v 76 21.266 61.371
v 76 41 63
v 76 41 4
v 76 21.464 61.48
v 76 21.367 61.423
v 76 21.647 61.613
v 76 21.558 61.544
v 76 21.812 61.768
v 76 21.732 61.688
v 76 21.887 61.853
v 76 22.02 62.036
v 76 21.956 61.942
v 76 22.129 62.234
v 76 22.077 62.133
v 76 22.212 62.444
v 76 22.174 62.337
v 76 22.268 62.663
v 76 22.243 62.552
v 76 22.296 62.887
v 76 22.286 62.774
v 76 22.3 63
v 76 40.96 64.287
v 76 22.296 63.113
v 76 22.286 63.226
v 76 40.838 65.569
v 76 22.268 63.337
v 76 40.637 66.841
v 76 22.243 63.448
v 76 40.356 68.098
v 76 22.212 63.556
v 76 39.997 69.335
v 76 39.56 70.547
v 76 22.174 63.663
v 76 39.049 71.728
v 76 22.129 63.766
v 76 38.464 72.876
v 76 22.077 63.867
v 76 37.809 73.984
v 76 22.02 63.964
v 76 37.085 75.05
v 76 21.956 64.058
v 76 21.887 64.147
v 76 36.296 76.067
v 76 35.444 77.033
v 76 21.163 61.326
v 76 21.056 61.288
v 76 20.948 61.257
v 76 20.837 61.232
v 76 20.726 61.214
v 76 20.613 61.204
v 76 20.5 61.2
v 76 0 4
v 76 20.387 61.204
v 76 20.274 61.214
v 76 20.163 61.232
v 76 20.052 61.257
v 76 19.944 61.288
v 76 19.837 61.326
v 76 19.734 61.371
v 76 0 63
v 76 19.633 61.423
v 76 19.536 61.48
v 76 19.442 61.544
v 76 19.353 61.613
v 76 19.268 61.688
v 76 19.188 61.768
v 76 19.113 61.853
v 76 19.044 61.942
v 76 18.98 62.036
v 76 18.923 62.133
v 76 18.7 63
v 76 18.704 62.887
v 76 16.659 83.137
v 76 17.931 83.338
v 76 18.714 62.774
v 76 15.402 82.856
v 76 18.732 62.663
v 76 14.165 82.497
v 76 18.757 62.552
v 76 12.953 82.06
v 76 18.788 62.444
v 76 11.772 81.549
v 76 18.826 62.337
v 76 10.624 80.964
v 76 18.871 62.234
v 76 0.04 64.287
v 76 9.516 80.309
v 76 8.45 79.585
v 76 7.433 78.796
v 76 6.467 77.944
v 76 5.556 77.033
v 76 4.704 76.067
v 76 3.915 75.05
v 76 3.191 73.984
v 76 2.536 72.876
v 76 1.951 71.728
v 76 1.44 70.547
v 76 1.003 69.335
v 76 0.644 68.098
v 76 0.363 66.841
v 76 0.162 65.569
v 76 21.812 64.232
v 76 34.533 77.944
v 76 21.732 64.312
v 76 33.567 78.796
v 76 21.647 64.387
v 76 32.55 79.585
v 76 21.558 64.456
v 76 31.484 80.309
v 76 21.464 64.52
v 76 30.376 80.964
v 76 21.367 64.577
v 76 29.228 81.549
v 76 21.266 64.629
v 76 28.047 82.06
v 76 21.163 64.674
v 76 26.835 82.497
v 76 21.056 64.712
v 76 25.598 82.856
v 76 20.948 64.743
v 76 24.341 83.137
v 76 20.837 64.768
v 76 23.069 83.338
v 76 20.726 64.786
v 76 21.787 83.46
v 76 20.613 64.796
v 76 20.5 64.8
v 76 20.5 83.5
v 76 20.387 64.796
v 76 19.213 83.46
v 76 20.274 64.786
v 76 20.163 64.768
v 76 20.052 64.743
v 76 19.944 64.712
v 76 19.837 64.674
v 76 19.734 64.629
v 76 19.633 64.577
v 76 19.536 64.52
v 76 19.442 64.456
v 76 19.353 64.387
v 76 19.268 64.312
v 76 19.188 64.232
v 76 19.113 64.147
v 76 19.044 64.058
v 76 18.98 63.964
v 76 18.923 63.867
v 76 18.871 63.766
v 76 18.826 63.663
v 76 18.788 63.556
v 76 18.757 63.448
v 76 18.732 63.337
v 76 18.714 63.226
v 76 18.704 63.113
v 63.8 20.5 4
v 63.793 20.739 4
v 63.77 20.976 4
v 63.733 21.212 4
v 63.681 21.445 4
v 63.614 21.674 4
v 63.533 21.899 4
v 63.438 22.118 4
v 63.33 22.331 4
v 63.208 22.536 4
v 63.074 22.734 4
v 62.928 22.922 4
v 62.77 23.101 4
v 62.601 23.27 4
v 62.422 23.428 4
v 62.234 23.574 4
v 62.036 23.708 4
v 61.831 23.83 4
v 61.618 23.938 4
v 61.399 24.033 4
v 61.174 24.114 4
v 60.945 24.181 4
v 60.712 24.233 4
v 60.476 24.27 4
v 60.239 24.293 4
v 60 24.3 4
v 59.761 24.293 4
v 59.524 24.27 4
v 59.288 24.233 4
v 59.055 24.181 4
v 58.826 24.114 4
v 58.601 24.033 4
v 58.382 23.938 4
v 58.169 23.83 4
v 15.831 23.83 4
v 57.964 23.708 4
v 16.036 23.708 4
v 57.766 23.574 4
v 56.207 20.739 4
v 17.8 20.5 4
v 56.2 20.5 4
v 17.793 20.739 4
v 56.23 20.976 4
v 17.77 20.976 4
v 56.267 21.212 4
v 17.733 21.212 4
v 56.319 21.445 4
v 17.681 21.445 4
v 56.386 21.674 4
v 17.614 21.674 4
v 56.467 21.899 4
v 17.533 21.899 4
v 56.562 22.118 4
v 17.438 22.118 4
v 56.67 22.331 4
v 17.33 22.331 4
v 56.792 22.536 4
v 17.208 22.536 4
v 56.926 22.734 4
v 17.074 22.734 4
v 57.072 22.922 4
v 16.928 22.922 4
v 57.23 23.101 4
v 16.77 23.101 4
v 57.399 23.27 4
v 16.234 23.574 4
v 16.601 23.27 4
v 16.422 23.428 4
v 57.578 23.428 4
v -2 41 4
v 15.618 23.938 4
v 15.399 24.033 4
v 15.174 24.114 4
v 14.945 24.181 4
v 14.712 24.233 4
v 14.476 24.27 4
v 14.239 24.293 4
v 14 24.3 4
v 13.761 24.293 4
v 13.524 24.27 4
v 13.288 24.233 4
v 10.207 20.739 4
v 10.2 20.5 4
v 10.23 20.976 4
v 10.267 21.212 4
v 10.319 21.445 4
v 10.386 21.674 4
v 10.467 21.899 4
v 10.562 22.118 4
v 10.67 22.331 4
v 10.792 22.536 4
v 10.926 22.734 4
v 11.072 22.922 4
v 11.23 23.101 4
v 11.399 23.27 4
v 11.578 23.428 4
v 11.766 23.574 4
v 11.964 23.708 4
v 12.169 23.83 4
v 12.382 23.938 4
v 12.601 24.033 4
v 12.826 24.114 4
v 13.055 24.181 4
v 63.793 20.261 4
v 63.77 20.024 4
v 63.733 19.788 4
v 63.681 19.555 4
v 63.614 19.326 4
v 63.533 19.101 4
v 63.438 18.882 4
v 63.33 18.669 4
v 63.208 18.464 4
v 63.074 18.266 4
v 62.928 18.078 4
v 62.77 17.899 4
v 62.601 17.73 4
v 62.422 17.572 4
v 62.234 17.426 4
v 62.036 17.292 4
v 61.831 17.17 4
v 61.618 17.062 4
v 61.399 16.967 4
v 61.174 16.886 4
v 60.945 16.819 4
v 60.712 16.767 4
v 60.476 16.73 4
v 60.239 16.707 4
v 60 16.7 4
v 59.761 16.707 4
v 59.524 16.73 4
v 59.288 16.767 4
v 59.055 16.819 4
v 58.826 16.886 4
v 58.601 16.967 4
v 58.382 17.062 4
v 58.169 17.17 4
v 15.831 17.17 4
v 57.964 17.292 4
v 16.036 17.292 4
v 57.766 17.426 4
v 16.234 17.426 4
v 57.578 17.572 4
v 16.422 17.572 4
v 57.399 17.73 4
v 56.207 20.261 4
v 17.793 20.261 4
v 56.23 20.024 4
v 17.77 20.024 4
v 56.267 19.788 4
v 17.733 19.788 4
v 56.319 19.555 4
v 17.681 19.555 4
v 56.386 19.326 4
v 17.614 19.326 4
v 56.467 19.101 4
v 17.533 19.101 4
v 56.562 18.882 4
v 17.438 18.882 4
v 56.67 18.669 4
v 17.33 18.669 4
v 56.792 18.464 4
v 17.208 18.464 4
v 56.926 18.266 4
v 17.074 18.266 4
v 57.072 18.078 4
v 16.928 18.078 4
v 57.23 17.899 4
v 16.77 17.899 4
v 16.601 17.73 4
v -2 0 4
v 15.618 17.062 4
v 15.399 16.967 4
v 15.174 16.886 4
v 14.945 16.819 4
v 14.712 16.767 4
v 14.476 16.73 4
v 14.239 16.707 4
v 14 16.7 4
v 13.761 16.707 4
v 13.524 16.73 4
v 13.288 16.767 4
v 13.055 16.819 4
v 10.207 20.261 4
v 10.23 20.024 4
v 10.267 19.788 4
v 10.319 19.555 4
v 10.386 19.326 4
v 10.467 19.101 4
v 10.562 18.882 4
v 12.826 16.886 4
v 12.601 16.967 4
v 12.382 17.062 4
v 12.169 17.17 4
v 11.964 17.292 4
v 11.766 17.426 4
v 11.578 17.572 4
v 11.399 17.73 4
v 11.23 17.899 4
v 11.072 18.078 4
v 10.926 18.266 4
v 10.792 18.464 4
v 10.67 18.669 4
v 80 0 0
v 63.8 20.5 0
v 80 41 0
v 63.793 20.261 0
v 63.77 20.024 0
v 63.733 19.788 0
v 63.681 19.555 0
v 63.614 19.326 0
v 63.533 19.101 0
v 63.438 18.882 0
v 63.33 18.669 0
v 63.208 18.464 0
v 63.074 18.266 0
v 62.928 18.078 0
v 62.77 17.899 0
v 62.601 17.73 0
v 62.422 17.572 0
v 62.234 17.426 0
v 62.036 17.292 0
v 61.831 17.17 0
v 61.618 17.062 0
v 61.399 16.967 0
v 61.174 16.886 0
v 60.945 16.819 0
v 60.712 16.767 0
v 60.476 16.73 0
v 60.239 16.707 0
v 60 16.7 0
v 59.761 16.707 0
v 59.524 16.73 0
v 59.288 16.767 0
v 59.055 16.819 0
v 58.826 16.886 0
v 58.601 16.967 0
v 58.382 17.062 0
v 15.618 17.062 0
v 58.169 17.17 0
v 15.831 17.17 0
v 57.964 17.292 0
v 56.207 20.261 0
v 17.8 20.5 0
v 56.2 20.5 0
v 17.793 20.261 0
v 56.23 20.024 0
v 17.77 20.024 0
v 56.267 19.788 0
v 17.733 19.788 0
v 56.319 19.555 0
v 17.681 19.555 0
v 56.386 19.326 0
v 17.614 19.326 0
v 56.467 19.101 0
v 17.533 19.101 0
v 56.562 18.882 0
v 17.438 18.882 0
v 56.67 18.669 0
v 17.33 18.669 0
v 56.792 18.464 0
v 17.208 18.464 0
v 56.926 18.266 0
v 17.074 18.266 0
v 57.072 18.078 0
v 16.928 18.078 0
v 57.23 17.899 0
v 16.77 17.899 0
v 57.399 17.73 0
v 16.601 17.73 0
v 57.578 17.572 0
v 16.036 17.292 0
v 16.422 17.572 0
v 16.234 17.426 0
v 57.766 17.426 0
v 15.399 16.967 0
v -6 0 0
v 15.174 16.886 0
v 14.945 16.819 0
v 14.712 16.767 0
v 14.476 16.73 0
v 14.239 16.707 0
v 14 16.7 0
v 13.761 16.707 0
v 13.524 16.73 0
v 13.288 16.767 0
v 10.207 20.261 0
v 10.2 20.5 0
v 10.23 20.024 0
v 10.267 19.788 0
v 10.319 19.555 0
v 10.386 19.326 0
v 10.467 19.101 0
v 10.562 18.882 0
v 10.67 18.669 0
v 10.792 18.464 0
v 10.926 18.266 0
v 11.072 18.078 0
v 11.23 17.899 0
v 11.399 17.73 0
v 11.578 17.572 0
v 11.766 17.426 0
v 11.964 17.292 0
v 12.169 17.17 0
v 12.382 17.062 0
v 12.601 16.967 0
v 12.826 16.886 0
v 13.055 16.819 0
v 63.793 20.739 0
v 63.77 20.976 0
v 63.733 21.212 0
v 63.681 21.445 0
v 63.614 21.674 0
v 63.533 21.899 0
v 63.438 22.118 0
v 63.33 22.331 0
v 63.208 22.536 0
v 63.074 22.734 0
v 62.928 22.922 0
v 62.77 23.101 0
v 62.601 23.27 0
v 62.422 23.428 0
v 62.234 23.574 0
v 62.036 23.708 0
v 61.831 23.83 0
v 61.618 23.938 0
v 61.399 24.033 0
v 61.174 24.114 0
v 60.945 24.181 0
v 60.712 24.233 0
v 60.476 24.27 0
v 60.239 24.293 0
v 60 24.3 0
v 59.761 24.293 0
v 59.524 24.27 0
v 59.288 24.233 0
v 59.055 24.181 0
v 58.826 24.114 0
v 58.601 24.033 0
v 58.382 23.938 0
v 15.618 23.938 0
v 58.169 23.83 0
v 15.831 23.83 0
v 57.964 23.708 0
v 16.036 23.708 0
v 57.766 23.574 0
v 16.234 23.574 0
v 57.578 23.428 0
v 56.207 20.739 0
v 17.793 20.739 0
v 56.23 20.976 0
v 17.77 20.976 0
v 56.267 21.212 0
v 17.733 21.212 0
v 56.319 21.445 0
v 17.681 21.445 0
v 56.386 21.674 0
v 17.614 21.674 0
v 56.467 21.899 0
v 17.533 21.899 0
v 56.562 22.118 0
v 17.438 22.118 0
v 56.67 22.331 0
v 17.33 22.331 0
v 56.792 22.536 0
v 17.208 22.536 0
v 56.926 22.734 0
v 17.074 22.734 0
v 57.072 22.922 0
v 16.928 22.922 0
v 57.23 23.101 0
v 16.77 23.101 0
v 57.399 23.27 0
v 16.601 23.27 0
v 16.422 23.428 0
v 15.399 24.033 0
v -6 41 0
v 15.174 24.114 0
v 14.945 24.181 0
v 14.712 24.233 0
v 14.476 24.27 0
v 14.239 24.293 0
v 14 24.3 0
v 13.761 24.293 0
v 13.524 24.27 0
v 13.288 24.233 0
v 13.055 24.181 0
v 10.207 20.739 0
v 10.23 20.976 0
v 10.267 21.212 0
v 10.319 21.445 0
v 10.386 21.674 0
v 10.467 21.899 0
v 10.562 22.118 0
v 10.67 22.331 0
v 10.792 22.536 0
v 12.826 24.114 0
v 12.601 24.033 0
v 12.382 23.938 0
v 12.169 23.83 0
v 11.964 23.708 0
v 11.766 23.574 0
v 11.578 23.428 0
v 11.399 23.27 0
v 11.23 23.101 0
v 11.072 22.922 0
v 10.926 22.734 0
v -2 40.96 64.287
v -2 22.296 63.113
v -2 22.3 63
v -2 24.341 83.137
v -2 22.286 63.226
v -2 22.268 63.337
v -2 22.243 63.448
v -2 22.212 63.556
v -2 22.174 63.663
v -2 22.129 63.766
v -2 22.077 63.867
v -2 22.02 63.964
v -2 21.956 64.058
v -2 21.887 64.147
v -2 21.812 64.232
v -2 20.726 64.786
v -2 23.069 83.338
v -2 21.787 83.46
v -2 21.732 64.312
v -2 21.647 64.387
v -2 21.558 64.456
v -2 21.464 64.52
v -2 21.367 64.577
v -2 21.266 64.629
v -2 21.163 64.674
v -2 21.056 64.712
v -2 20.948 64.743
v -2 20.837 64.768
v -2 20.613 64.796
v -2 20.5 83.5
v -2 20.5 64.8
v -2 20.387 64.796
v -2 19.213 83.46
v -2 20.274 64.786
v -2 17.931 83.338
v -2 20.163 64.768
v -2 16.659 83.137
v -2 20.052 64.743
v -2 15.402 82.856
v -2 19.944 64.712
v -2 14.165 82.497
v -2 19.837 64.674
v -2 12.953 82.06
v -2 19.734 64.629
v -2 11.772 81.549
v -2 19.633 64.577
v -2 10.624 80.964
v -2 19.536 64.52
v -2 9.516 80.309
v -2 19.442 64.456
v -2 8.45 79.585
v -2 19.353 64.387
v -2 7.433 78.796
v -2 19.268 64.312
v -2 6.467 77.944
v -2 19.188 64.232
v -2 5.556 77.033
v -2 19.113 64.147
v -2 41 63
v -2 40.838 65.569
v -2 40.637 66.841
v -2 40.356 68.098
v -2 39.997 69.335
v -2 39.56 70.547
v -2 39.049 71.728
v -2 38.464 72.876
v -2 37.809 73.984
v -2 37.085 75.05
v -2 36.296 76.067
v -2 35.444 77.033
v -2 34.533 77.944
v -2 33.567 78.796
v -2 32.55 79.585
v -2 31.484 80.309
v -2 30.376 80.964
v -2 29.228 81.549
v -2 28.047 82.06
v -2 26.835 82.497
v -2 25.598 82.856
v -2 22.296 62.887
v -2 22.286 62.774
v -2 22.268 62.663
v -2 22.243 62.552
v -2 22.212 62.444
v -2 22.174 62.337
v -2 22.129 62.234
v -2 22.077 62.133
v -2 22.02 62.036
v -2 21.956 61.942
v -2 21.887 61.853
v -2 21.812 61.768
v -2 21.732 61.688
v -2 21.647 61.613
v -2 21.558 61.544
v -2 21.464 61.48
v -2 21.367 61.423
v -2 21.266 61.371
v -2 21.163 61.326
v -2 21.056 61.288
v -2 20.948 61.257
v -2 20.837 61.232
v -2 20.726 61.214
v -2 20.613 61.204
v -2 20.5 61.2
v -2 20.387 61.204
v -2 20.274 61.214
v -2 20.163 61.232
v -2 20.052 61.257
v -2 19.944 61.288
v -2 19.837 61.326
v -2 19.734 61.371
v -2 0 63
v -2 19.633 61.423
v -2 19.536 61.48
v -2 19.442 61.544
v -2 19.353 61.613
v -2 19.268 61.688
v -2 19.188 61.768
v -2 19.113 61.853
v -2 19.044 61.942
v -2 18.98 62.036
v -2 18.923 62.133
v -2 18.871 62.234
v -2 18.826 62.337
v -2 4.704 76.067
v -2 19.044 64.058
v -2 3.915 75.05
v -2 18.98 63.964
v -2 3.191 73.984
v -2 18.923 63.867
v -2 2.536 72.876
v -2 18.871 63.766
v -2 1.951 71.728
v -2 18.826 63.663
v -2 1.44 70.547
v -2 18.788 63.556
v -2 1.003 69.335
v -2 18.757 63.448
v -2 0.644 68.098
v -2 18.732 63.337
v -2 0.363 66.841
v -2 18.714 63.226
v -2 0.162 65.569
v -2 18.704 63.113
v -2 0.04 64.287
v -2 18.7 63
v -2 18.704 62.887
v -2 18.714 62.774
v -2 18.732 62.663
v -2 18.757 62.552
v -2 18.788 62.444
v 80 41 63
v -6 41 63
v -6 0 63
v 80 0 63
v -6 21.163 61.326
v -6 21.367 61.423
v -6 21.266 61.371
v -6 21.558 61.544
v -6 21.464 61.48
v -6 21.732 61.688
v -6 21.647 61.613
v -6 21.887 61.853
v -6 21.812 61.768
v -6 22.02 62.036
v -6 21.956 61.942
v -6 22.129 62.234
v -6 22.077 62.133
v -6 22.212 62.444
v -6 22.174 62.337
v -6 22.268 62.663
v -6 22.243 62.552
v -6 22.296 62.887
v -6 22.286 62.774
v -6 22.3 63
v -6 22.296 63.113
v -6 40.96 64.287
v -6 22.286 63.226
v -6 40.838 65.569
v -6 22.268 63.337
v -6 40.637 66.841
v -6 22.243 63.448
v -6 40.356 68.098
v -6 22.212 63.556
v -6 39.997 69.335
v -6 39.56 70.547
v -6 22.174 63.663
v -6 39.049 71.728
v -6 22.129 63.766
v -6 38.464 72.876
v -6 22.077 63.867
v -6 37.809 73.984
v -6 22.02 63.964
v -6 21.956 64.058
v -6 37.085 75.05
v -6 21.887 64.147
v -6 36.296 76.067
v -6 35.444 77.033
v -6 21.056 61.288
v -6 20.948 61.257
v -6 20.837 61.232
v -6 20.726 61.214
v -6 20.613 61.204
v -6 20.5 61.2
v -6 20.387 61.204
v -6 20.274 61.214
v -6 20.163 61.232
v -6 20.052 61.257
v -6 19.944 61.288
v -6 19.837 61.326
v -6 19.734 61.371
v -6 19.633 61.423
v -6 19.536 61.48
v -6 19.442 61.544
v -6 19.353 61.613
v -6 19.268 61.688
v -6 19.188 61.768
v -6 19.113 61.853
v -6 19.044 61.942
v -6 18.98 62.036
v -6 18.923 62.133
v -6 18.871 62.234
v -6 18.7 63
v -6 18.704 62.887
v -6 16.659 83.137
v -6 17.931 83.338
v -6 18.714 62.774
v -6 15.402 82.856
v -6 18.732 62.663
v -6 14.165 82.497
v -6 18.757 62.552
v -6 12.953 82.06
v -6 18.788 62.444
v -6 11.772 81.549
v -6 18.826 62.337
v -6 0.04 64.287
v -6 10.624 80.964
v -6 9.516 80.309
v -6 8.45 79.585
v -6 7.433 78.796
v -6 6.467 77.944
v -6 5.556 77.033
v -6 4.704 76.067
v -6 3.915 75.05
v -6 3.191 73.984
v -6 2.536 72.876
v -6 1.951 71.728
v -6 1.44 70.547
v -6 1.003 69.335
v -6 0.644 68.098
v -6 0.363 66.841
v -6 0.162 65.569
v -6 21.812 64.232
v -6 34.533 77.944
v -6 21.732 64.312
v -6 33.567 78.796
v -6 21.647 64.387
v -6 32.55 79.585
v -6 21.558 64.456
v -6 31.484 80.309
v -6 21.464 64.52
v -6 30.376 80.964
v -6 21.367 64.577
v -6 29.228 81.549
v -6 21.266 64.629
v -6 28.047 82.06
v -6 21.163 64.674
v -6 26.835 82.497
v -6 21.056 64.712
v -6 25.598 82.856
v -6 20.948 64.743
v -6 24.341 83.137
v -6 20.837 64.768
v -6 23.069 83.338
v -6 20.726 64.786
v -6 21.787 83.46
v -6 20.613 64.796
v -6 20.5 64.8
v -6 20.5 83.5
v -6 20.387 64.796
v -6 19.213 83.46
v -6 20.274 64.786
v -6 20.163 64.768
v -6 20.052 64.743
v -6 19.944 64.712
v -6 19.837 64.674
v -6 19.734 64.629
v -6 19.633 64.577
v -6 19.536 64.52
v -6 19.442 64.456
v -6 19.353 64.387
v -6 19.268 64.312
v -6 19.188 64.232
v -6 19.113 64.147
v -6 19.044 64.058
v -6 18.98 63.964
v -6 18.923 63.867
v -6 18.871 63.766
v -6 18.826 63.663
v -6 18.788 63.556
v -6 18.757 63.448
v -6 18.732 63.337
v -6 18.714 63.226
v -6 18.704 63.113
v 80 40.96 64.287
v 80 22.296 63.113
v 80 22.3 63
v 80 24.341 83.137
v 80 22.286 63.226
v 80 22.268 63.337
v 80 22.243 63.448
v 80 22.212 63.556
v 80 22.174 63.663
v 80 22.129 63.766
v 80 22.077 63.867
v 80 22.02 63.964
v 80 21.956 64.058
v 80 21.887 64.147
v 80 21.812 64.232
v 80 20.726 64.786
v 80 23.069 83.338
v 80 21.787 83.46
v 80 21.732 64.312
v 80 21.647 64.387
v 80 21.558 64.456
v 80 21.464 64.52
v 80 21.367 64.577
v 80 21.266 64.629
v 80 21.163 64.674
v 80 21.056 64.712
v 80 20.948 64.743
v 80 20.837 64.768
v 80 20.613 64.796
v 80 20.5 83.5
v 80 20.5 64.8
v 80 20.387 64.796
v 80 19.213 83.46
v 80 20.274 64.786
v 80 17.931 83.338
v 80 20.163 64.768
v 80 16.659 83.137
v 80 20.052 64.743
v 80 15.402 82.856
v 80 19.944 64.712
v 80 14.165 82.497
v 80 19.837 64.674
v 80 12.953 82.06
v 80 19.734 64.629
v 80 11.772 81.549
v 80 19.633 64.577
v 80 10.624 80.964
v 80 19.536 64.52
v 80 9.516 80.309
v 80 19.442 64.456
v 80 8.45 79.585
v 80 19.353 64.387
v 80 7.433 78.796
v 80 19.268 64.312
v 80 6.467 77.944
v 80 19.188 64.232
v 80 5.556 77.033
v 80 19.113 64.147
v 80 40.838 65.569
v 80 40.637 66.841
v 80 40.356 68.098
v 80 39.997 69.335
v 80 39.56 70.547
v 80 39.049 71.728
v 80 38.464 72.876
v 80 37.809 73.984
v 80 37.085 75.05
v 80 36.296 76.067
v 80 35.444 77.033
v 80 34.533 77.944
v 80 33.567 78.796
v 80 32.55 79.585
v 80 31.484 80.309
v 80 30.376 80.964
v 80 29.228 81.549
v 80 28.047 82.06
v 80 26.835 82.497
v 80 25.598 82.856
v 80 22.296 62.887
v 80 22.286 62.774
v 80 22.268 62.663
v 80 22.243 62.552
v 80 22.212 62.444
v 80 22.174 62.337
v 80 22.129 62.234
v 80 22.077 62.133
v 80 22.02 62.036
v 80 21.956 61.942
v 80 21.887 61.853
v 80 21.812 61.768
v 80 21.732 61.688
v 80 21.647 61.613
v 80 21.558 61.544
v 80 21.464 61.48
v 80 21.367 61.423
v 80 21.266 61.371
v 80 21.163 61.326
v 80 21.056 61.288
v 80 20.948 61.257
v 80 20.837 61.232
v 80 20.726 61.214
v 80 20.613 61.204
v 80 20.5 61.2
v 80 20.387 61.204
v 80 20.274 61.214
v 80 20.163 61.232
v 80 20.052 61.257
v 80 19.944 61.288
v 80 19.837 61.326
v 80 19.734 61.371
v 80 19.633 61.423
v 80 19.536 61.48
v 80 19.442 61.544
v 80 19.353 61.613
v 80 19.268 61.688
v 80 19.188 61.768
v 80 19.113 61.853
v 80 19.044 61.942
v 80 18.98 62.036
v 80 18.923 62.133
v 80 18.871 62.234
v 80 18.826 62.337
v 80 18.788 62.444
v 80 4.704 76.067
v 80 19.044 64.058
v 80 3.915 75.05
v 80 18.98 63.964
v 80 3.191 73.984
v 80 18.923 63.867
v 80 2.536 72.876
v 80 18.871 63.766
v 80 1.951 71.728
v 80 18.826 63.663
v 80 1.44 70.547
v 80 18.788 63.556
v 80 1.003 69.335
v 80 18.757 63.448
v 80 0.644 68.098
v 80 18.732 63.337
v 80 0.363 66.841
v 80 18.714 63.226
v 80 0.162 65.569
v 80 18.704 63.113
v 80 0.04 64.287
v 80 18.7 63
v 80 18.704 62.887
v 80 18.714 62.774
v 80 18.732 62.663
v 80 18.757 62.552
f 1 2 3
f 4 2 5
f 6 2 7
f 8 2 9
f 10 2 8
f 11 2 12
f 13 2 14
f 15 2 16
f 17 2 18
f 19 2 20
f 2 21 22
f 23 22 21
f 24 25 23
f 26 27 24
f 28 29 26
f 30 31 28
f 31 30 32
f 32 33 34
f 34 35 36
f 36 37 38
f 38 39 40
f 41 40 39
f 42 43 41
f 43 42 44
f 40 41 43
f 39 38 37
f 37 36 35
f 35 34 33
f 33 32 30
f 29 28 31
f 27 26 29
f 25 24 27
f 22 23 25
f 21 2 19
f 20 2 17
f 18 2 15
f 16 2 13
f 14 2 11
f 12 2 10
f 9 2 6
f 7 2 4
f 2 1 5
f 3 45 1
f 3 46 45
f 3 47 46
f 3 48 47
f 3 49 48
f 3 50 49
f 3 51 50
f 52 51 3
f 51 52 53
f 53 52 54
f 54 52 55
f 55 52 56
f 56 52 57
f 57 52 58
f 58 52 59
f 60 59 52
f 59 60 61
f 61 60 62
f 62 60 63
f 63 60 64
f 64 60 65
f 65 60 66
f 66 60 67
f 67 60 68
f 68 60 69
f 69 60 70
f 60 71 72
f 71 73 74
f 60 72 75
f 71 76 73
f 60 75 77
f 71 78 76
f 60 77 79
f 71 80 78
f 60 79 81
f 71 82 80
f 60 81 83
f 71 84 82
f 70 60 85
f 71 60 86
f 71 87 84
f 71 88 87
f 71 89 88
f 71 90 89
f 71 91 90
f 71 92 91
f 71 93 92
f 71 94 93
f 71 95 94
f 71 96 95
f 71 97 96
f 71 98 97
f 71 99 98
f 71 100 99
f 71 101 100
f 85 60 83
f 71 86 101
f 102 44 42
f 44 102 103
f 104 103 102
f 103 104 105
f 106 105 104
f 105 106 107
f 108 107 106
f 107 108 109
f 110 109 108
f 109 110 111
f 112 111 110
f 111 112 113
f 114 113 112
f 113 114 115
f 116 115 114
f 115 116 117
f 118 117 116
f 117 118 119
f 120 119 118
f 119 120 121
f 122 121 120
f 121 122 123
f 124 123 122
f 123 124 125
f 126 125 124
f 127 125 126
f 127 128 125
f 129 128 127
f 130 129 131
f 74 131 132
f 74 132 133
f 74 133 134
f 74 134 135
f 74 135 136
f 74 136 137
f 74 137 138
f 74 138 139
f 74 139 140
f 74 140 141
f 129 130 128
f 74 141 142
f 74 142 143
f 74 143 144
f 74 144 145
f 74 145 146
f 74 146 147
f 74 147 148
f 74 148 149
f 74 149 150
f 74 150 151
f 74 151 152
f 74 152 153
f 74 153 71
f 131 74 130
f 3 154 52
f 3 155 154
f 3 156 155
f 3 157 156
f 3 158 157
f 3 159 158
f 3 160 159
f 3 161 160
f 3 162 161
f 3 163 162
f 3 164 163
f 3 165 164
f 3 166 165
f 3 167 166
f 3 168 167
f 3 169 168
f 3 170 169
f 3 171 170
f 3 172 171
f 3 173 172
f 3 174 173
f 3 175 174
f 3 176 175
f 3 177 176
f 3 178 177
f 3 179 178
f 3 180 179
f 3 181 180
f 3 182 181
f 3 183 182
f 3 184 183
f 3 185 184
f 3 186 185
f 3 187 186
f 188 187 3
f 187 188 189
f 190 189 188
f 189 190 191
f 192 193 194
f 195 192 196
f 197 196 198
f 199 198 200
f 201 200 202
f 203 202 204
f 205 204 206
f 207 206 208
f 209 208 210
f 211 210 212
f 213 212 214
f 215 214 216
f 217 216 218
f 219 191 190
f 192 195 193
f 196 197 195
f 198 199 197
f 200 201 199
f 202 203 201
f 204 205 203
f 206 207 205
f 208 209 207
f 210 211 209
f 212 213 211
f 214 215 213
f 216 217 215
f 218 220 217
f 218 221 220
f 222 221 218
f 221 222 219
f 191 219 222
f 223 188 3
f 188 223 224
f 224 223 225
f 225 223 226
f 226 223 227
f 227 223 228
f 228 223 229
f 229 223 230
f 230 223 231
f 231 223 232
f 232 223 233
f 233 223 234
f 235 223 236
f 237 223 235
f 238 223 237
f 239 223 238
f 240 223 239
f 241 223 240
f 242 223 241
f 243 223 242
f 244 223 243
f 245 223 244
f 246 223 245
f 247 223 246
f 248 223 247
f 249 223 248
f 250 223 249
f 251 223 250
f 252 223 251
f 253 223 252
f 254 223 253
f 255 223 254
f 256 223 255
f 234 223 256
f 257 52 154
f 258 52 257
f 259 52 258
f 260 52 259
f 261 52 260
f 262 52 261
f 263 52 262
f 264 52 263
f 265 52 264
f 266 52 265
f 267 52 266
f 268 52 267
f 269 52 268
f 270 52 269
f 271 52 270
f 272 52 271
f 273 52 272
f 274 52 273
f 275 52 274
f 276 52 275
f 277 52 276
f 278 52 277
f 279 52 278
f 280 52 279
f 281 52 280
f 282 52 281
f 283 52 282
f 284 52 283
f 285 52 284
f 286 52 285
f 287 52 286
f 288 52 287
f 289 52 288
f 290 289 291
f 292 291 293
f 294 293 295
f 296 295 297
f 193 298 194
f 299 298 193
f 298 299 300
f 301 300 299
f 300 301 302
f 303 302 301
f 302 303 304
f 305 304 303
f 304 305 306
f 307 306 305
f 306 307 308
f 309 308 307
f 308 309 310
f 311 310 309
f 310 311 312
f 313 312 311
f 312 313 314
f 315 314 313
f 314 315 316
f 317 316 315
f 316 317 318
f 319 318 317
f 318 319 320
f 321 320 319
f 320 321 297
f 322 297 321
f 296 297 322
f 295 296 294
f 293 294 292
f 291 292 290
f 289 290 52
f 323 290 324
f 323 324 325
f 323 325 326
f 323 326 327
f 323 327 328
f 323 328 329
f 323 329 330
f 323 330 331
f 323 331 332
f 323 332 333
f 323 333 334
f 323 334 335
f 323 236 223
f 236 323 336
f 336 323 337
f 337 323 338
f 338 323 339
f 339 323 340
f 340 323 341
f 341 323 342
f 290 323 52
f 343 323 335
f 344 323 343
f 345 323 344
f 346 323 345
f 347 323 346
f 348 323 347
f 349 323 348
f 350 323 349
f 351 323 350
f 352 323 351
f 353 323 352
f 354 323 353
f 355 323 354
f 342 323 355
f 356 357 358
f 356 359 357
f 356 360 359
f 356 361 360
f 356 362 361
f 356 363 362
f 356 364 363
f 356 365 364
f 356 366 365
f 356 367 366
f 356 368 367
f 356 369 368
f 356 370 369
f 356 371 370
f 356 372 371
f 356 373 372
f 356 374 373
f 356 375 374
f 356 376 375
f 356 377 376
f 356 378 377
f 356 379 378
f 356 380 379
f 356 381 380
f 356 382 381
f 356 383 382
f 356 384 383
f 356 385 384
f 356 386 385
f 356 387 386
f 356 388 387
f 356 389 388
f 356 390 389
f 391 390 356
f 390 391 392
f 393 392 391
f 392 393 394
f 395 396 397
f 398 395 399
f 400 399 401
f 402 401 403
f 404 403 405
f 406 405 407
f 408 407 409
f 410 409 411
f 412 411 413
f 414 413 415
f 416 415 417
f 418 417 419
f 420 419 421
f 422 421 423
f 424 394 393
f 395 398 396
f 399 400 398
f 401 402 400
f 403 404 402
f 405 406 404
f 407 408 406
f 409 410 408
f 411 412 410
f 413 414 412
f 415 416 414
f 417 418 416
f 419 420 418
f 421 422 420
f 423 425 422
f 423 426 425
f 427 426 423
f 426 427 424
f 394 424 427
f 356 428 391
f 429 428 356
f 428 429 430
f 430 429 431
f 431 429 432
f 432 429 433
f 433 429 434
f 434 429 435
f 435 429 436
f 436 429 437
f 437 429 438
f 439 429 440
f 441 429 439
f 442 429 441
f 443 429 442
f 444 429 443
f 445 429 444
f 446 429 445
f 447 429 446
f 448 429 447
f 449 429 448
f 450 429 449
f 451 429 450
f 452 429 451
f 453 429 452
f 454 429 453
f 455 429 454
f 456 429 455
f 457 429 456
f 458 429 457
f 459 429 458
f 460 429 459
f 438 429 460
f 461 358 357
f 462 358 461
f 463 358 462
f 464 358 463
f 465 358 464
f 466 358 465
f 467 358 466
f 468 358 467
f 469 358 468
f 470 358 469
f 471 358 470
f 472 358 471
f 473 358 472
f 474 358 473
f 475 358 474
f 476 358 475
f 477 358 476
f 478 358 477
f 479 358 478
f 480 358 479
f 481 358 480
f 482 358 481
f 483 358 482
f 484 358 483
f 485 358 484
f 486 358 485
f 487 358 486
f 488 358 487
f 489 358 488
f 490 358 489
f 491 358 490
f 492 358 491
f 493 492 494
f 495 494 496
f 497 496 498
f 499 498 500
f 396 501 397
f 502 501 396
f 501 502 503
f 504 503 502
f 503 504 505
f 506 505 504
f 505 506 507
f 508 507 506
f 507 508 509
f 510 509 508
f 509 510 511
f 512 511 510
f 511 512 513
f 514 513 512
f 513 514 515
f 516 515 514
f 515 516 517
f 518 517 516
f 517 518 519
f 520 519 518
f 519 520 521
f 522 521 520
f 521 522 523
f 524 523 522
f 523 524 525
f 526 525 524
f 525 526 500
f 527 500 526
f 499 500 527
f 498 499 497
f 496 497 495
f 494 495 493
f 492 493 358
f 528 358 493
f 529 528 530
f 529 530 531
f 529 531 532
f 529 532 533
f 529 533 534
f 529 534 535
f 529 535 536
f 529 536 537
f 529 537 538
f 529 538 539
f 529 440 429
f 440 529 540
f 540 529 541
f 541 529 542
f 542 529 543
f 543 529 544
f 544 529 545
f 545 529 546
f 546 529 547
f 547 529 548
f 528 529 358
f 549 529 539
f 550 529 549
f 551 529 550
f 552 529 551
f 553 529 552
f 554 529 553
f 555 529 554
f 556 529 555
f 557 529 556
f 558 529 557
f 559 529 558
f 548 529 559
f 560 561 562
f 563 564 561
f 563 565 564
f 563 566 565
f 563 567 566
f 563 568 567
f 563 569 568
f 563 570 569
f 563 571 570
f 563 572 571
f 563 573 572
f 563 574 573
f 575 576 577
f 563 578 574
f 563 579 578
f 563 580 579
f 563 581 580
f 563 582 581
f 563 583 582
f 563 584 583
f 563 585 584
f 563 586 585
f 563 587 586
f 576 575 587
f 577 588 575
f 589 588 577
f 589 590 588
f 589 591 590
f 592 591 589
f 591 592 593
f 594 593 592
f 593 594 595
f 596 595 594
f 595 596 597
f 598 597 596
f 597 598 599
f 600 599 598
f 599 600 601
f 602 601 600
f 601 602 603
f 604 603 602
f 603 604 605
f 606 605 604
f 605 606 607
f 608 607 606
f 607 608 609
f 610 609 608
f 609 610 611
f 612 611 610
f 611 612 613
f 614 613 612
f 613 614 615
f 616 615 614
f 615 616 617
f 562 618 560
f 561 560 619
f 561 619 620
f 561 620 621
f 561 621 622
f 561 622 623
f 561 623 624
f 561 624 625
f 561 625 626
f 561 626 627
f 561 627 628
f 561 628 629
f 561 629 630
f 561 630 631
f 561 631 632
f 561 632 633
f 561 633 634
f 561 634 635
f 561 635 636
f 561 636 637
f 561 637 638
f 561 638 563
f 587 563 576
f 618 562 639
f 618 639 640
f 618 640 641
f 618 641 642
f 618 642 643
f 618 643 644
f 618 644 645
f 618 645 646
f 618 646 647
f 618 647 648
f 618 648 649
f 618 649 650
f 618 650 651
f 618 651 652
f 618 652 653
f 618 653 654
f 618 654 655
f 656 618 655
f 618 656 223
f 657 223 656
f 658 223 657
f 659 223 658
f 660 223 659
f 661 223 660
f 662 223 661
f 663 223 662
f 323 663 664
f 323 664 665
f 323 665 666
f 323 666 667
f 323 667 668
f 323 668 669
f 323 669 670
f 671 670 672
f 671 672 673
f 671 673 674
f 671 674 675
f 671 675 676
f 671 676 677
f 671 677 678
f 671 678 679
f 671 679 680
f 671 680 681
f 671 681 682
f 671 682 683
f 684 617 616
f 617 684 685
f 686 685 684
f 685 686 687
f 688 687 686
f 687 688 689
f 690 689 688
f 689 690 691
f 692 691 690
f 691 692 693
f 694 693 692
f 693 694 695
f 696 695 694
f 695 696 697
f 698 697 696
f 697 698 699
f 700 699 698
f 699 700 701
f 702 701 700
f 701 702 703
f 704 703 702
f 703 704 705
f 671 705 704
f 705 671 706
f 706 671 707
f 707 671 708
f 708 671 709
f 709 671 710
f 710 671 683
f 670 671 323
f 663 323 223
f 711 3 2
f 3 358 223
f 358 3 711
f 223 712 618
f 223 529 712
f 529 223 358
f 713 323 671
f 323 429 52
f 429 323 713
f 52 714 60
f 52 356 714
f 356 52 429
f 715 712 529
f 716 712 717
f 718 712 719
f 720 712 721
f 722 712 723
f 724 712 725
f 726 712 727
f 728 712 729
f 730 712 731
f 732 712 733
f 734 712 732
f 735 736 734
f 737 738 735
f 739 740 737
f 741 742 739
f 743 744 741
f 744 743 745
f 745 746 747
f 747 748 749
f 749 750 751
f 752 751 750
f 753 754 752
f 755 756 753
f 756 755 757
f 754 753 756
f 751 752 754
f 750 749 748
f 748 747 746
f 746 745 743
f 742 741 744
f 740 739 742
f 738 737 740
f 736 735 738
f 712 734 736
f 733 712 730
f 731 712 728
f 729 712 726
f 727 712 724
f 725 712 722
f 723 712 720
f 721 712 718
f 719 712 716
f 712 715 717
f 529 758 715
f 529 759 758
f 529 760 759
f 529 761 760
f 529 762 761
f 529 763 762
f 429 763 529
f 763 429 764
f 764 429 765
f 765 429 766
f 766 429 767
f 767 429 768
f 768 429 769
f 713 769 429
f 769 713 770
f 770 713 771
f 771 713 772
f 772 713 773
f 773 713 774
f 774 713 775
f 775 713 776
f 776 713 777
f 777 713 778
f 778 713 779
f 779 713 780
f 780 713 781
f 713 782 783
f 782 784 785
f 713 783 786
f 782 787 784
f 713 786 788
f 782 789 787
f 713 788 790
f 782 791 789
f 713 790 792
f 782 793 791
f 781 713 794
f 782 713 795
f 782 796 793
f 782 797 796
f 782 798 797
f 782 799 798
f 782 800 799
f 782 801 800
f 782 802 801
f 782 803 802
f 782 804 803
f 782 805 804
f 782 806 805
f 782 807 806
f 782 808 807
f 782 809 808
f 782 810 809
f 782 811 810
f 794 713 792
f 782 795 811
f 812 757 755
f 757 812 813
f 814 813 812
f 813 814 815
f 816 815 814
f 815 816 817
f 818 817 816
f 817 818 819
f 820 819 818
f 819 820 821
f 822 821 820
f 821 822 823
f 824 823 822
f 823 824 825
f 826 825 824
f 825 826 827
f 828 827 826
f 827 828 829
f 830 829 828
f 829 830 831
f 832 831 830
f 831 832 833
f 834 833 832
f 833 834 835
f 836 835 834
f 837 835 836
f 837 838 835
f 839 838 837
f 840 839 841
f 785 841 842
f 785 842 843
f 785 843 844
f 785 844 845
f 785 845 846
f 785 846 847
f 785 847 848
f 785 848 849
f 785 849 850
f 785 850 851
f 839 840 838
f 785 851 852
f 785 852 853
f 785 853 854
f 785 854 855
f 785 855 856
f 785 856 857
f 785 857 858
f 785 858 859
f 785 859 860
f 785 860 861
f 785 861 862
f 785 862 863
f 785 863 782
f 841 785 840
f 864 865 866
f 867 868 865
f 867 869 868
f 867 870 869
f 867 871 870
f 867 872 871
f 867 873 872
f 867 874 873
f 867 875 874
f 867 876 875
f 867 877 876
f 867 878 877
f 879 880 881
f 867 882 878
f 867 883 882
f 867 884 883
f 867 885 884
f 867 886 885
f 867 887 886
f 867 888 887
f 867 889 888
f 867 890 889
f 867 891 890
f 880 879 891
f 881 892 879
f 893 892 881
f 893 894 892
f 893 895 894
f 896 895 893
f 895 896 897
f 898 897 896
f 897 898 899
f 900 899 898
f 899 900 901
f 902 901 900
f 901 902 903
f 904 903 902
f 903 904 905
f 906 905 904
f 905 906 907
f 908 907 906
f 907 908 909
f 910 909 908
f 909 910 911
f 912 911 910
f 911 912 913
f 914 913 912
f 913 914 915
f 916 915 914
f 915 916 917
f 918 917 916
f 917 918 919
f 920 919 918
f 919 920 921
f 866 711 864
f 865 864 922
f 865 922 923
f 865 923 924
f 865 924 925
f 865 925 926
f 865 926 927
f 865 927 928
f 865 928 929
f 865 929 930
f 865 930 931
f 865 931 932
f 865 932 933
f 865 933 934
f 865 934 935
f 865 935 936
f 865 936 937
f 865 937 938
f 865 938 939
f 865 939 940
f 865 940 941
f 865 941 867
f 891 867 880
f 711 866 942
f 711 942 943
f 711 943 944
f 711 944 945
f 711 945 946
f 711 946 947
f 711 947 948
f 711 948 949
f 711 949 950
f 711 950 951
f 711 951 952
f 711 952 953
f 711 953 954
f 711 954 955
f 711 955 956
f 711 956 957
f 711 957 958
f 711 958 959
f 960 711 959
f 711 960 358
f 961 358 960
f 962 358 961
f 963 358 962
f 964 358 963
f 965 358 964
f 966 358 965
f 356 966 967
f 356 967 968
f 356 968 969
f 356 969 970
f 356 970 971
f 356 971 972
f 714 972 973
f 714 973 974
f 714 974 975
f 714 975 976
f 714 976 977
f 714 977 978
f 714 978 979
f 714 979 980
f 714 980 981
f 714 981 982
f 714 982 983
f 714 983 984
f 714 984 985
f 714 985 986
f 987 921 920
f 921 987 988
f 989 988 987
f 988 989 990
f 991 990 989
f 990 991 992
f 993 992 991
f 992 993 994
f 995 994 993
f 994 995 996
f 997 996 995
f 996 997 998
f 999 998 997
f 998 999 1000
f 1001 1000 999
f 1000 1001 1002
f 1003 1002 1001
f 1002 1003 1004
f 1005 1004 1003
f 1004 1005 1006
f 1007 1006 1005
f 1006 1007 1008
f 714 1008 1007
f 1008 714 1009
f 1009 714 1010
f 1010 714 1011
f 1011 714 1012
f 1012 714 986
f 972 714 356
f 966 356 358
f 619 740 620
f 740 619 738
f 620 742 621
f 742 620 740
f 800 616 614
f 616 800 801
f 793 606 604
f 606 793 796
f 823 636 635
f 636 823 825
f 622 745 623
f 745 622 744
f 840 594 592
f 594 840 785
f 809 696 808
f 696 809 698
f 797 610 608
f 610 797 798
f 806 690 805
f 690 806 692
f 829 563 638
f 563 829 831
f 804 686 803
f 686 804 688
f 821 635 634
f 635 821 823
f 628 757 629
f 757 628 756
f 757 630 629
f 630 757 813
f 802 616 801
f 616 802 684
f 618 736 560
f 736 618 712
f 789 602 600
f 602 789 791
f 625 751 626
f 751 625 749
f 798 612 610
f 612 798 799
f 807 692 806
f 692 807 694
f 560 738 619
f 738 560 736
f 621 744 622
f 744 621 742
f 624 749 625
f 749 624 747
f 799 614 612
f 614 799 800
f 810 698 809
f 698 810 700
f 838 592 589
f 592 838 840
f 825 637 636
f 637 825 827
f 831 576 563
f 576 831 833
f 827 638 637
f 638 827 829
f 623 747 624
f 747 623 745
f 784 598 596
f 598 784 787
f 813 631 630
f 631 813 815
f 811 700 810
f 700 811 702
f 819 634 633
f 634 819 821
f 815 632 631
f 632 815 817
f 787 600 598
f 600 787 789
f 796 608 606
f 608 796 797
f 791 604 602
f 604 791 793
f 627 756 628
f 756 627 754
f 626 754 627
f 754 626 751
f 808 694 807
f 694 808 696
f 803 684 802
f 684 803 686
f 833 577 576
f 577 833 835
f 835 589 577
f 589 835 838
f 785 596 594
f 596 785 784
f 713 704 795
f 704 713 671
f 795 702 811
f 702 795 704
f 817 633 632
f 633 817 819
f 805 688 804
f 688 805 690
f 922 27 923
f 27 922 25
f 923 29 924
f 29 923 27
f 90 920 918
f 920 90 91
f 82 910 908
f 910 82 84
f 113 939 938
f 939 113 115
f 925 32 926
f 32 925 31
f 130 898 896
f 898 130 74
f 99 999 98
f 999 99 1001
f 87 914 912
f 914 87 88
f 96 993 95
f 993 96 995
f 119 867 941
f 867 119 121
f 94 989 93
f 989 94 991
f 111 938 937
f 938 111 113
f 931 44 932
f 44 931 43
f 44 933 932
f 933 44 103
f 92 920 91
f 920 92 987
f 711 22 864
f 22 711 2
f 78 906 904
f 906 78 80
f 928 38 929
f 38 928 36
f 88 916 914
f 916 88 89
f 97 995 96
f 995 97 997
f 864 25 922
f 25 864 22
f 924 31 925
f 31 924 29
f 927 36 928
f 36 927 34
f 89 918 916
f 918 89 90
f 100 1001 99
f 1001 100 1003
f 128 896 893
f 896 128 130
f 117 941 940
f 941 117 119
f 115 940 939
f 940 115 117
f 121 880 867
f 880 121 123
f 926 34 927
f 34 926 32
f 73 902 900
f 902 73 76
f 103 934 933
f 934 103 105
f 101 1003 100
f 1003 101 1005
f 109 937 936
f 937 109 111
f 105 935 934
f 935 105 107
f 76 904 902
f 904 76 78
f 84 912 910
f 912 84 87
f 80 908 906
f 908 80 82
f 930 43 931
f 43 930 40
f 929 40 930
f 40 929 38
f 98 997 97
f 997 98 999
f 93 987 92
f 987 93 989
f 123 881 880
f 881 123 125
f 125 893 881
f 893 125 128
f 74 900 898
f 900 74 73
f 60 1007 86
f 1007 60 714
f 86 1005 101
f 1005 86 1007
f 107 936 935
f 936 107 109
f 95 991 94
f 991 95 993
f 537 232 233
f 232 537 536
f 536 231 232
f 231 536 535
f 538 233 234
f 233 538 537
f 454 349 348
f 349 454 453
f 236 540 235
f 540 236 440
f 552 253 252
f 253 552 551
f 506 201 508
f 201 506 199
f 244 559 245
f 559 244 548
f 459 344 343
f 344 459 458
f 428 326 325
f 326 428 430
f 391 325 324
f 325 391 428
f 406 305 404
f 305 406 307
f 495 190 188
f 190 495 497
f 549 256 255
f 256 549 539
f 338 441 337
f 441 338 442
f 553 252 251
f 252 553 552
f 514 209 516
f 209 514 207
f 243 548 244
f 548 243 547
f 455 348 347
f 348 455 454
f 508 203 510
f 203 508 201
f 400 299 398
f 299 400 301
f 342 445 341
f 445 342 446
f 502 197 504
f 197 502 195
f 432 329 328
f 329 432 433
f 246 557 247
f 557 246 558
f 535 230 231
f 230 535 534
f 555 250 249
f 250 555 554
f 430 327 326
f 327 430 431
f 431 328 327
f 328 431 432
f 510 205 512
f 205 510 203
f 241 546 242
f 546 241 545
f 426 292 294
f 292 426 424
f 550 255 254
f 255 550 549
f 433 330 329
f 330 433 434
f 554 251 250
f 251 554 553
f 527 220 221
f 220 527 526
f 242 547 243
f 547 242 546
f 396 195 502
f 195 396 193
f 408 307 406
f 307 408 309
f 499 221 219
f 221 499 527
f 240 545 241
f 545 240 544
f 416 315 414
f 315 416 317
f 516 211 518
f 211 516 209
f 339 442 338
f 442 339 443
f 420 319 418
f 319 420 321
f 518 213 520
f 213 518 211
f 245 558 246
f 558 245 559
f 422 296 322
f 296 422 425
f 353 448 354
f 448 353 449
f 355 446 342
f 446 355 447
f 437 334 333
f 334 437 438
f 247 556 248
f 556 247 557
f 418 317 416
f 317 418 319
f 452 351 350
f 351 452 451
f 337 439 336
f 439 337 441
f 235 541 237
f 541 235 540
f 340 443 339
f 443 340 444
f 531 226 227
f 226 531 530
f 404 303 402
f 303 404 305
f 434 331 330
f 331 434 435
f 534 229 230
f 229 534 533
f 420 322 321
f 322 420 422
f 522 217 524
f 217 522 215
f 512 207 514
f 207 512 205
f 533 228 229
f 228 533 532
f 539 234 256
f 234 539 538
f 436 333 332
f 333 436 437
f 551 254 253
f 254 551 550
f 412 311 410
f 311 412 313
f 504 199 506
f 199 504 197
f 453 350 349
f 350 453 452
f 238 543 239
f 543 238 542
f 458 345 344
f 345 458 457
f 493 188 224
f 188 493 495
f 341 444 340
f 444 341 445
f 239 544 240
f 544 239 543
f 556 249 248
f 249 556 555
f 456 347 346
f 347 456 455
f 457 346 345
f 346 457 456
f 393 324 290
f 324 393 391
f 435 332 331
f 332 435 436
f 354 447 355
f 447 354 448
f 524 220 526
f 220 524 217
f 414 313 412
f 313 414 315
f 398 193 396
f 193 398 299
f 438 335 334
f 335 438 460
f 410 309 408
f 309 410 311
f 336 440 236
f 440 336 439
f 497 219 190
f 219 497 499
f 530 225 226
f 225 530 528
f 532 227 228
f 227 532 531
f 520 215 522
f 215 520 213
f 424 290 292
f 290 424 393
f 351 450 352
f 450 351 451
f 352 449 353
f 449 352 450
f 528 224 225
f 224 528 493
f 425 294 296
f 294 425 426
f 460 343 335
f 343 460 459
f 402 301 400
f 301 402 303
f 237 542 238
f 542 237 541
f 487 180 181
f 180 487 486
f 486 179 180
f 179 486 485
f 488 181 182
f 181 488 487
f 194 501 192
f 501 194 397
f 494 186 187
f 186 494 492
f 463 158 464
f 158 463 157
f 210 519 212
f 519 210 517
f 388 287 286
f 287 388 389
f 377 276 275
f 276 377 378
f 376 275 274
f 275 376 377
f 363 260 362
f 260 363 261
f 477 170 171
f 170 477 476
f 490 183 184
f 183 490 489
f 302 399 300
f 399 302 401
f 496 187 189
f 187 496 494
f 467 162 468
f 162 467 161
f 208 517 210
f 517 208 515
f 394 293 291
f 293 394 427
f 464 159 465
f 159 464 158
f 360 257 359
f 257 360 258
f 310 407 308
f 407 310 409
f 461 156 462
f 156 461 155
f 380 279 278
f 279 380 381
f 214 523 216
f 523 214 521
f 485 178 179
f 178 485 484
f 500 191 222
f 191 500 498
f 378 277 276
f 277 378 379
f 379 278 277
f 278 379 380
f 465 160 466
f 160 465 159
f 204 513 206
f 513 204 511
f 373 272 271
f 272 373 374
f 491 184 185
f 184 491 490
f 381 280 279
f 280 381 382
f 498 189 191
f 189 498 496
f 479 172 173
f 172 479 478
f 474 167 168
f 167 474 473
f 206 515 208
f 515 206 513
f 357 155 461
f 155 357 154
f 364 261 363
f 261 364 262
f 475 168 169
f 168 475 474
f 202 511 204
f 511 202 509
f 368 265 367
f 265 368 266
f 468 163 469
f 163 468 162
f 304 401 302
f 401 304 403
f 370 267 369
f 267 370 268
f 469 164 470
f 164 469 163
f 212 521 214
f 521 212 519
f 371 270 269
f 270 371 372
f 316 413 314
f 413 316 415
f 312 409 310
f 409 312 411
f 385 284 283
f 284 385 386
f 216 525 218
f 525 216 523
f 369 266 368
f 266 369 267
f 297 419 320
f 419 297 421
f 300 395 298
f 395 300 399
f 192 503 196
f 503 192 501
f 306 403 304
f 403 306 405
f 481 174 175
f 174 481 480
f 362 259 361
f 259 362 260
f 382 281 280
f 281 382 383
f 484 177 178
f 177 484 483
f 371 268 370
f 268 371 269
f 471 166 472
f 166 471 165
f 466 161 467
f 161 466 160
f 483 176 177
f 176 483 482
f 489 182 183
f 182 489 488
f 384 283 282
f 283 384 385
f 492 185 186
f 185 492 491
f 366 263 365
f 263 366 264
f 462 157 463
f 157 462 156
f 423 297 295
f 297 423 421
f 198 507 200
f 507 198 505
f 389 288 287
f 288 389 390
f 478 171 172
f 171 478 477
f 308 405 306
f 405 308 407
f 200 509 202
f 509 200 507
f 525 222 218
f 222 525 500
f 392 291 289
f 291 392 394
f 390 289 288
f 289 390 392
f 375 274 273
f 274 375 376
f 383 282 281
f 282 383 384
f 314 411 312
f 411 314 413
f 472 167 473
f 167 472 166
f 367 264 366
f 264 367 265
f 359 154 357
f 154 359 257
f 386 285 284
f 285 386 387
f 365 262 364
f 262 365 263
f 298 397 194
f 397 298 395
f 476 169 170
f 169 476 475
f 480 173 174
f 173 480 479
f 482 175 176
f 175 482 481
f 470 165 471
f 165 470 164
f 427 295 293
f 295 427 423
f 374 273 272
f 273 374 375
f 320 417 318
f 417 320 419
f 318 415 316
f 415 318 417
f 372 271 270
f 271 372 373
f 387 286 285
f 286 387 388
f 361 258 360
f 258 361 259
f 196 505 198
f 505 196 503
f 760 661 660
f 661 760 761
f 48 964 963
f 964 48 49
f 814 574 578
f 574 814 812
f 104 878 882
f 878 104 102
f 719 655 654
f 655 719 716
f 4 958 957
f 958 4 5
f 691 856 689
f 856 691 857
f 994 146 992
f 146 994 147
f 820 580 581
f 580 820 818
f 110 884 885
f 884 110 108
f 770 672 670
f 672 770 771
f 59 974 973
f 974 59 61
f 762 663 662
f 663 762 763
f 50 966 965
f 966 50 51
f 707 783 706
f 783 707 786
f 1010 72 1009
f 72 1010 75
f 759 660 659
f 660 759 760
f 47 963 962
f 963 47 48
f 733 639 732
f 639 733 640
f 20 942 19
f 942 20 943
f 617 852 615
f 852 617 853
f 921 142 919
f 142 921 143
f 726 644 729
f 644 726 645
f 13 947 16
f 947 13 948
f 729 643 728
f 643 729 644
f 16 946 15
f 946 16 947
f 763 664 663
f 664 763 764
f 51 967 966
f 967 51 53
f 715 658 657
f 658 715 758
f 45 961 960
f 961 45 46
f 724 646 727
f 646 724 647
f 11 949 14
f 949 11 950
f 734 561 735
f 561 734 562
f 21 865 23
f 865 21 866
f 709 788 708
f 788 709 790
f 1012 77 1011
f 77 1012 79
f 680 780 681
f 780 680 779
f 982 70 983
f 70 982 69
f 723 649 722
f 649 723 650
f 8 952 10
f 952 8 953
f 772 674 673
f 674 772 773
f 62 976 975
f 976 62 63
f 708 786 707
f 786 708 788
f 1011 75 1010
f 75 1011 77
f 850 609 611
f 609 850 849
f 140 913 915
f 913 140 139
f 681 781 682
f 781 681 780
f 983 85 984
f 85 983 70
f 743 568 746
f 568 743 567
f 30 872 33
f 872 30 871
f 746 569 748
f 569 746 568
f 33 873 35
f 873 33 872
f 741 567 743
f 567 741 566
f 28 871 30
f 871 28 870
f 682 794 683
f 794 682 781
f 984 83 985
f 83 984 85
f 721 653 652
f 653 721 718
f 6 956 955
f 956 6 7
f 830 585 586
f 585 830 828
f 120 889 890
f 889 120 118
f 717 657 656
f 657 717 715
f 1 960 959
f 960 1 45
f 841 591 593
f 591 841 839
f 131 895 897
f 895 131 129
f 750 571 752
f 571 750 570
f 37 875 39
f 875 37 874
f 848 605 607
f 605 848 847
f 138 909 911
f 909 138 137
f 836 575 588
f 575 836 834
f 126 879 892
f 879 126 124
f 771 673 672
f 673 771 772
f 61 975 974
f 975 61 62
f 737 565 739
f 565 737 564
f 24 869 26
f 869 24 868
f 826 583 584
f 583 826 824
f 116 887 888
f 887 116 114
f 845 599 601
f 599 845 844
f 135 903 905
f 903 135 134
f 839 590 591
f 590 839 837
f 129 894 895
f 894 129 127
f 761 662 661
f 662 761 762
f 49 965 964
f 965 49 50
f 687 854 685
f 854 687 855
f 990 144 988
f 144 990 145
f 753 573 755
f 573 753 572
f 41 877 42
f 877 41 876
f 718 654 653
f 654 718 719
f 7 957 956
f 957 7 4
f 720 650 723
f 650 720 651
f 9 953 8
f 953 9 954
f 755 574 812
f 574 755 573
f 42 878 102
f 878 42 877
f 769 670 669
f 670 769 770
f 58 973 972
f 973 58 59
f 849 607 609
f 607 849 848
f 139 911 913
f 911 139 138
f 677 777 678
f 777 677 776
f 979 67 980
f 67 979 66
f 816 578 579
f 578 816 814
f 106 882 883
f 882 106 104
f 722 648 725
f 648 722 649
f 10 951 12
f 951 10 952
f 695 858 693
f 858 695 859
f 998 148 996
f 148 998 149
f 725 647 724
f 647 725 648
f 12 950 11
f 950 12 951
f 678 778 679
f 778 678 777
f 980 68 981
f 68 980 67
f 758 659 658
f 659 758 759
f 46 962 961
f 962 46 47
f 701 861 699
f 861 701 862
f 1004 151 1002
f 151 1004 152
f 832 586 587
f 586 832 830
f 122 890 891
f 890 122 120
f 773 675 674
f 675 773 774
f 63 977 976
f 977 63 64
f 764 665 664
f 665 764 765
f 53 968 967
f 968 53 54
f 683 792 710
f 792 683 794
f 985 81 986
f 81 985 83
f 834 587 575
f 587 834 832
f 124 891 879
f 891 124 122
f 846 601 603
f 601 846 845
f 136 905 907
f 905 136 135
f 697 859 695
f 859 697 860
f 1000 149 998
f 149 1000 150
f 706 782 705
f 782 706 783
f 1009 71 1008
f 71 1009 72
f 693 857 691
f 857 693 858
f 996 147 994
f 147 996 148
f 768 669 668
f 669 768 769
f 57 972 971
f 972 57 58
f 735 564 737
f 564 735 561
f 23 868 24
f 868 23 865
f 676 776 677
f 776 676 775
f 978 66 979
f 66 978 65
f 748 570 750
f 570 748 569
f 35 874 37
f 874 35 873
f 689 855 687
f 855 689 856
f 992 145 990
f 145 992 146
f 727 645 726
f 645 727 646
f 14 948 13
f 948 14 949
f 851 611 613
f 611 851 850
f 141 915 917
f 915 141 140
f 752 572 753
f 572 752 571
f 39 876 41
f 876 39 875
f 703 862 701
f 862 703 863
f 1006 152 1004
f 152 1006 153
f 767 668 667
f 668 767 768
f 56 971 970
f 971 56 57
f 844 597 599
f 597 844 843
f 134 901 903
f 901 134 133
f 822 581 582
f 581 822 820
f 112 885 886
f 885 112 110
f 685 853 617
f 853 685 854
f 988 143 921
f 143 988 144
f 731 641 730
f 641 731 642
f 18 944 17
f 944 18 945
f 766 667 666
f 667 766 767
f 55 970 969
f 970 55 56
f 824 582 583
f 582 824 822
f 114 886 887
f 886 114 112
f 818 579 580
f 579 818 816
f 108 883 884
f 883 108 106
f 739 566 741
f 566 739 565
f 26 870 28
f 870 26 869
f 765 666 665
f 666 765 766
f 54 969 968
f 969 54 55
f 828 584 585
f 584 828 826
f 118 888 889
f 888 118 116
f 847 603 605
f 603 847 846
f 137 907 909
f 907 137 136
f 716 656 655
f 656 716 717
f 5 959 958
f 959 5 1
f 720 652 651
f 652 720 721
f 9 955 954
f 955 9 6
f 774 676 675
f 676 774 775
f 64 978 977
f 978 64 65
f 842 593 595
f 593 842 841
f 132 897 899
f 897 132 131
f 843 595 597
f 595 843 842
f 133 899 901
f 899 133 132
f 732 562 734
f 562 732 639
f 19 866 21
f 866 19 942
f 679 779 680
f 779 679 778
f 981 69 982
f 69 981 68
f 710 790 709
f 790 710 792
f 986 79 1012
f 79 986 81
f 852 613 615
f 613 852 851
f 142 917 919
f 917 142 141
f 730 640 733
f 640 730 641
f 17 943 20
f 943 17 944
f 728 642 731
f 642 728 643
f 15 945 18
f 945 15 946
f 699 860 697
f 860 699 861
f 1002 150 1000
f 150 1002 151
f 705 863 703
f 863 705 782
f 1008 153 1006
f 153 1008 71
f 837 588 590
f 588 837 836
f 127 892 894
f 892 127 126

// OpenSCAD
difference(){
	union(){
        
       translate([-2,0,0]){
           cube([78,41,4], center=false);
       }

       translate([-6,0,0]){
           cube([4,41,48+15], center=false);
       }
       translate([76,0,0]){
           cube([4,41,48+15], center=false);
       }
       translate([-6,41/2,48+15]){
            rotate(a = [0,90,0]) {
              cylinder(h=4, r=41/2, $fn=100, center=false);
            }
       }	
       translate([76,41/2,48+15]){
            rotate(a = [0,90,0]) {
              cylinder(h=4, r=41/2, $fn=100, center=false);
            }
       }	


	}
	union() {
 
       translate([74/2-23,41/2,-1]){
            rotate(a = [0,0,90]) {
              cylinder(h=600, r=3.8, $fn=100, center=false);
            }
       }	
       translate([74/2+23,41/2,-1]){
            rotate(a = [0,0,90]) {
              cylinder(h=600, r=3.8, $fn=100, center=false);
            }
       }	
       
       translate([-10,41/2,48+15]){
            rotate(a = [0,90,0]) {
              cylinder(h=999, r=1.8, $fn=100, center=false);
            }
       }	




        
	}
}
